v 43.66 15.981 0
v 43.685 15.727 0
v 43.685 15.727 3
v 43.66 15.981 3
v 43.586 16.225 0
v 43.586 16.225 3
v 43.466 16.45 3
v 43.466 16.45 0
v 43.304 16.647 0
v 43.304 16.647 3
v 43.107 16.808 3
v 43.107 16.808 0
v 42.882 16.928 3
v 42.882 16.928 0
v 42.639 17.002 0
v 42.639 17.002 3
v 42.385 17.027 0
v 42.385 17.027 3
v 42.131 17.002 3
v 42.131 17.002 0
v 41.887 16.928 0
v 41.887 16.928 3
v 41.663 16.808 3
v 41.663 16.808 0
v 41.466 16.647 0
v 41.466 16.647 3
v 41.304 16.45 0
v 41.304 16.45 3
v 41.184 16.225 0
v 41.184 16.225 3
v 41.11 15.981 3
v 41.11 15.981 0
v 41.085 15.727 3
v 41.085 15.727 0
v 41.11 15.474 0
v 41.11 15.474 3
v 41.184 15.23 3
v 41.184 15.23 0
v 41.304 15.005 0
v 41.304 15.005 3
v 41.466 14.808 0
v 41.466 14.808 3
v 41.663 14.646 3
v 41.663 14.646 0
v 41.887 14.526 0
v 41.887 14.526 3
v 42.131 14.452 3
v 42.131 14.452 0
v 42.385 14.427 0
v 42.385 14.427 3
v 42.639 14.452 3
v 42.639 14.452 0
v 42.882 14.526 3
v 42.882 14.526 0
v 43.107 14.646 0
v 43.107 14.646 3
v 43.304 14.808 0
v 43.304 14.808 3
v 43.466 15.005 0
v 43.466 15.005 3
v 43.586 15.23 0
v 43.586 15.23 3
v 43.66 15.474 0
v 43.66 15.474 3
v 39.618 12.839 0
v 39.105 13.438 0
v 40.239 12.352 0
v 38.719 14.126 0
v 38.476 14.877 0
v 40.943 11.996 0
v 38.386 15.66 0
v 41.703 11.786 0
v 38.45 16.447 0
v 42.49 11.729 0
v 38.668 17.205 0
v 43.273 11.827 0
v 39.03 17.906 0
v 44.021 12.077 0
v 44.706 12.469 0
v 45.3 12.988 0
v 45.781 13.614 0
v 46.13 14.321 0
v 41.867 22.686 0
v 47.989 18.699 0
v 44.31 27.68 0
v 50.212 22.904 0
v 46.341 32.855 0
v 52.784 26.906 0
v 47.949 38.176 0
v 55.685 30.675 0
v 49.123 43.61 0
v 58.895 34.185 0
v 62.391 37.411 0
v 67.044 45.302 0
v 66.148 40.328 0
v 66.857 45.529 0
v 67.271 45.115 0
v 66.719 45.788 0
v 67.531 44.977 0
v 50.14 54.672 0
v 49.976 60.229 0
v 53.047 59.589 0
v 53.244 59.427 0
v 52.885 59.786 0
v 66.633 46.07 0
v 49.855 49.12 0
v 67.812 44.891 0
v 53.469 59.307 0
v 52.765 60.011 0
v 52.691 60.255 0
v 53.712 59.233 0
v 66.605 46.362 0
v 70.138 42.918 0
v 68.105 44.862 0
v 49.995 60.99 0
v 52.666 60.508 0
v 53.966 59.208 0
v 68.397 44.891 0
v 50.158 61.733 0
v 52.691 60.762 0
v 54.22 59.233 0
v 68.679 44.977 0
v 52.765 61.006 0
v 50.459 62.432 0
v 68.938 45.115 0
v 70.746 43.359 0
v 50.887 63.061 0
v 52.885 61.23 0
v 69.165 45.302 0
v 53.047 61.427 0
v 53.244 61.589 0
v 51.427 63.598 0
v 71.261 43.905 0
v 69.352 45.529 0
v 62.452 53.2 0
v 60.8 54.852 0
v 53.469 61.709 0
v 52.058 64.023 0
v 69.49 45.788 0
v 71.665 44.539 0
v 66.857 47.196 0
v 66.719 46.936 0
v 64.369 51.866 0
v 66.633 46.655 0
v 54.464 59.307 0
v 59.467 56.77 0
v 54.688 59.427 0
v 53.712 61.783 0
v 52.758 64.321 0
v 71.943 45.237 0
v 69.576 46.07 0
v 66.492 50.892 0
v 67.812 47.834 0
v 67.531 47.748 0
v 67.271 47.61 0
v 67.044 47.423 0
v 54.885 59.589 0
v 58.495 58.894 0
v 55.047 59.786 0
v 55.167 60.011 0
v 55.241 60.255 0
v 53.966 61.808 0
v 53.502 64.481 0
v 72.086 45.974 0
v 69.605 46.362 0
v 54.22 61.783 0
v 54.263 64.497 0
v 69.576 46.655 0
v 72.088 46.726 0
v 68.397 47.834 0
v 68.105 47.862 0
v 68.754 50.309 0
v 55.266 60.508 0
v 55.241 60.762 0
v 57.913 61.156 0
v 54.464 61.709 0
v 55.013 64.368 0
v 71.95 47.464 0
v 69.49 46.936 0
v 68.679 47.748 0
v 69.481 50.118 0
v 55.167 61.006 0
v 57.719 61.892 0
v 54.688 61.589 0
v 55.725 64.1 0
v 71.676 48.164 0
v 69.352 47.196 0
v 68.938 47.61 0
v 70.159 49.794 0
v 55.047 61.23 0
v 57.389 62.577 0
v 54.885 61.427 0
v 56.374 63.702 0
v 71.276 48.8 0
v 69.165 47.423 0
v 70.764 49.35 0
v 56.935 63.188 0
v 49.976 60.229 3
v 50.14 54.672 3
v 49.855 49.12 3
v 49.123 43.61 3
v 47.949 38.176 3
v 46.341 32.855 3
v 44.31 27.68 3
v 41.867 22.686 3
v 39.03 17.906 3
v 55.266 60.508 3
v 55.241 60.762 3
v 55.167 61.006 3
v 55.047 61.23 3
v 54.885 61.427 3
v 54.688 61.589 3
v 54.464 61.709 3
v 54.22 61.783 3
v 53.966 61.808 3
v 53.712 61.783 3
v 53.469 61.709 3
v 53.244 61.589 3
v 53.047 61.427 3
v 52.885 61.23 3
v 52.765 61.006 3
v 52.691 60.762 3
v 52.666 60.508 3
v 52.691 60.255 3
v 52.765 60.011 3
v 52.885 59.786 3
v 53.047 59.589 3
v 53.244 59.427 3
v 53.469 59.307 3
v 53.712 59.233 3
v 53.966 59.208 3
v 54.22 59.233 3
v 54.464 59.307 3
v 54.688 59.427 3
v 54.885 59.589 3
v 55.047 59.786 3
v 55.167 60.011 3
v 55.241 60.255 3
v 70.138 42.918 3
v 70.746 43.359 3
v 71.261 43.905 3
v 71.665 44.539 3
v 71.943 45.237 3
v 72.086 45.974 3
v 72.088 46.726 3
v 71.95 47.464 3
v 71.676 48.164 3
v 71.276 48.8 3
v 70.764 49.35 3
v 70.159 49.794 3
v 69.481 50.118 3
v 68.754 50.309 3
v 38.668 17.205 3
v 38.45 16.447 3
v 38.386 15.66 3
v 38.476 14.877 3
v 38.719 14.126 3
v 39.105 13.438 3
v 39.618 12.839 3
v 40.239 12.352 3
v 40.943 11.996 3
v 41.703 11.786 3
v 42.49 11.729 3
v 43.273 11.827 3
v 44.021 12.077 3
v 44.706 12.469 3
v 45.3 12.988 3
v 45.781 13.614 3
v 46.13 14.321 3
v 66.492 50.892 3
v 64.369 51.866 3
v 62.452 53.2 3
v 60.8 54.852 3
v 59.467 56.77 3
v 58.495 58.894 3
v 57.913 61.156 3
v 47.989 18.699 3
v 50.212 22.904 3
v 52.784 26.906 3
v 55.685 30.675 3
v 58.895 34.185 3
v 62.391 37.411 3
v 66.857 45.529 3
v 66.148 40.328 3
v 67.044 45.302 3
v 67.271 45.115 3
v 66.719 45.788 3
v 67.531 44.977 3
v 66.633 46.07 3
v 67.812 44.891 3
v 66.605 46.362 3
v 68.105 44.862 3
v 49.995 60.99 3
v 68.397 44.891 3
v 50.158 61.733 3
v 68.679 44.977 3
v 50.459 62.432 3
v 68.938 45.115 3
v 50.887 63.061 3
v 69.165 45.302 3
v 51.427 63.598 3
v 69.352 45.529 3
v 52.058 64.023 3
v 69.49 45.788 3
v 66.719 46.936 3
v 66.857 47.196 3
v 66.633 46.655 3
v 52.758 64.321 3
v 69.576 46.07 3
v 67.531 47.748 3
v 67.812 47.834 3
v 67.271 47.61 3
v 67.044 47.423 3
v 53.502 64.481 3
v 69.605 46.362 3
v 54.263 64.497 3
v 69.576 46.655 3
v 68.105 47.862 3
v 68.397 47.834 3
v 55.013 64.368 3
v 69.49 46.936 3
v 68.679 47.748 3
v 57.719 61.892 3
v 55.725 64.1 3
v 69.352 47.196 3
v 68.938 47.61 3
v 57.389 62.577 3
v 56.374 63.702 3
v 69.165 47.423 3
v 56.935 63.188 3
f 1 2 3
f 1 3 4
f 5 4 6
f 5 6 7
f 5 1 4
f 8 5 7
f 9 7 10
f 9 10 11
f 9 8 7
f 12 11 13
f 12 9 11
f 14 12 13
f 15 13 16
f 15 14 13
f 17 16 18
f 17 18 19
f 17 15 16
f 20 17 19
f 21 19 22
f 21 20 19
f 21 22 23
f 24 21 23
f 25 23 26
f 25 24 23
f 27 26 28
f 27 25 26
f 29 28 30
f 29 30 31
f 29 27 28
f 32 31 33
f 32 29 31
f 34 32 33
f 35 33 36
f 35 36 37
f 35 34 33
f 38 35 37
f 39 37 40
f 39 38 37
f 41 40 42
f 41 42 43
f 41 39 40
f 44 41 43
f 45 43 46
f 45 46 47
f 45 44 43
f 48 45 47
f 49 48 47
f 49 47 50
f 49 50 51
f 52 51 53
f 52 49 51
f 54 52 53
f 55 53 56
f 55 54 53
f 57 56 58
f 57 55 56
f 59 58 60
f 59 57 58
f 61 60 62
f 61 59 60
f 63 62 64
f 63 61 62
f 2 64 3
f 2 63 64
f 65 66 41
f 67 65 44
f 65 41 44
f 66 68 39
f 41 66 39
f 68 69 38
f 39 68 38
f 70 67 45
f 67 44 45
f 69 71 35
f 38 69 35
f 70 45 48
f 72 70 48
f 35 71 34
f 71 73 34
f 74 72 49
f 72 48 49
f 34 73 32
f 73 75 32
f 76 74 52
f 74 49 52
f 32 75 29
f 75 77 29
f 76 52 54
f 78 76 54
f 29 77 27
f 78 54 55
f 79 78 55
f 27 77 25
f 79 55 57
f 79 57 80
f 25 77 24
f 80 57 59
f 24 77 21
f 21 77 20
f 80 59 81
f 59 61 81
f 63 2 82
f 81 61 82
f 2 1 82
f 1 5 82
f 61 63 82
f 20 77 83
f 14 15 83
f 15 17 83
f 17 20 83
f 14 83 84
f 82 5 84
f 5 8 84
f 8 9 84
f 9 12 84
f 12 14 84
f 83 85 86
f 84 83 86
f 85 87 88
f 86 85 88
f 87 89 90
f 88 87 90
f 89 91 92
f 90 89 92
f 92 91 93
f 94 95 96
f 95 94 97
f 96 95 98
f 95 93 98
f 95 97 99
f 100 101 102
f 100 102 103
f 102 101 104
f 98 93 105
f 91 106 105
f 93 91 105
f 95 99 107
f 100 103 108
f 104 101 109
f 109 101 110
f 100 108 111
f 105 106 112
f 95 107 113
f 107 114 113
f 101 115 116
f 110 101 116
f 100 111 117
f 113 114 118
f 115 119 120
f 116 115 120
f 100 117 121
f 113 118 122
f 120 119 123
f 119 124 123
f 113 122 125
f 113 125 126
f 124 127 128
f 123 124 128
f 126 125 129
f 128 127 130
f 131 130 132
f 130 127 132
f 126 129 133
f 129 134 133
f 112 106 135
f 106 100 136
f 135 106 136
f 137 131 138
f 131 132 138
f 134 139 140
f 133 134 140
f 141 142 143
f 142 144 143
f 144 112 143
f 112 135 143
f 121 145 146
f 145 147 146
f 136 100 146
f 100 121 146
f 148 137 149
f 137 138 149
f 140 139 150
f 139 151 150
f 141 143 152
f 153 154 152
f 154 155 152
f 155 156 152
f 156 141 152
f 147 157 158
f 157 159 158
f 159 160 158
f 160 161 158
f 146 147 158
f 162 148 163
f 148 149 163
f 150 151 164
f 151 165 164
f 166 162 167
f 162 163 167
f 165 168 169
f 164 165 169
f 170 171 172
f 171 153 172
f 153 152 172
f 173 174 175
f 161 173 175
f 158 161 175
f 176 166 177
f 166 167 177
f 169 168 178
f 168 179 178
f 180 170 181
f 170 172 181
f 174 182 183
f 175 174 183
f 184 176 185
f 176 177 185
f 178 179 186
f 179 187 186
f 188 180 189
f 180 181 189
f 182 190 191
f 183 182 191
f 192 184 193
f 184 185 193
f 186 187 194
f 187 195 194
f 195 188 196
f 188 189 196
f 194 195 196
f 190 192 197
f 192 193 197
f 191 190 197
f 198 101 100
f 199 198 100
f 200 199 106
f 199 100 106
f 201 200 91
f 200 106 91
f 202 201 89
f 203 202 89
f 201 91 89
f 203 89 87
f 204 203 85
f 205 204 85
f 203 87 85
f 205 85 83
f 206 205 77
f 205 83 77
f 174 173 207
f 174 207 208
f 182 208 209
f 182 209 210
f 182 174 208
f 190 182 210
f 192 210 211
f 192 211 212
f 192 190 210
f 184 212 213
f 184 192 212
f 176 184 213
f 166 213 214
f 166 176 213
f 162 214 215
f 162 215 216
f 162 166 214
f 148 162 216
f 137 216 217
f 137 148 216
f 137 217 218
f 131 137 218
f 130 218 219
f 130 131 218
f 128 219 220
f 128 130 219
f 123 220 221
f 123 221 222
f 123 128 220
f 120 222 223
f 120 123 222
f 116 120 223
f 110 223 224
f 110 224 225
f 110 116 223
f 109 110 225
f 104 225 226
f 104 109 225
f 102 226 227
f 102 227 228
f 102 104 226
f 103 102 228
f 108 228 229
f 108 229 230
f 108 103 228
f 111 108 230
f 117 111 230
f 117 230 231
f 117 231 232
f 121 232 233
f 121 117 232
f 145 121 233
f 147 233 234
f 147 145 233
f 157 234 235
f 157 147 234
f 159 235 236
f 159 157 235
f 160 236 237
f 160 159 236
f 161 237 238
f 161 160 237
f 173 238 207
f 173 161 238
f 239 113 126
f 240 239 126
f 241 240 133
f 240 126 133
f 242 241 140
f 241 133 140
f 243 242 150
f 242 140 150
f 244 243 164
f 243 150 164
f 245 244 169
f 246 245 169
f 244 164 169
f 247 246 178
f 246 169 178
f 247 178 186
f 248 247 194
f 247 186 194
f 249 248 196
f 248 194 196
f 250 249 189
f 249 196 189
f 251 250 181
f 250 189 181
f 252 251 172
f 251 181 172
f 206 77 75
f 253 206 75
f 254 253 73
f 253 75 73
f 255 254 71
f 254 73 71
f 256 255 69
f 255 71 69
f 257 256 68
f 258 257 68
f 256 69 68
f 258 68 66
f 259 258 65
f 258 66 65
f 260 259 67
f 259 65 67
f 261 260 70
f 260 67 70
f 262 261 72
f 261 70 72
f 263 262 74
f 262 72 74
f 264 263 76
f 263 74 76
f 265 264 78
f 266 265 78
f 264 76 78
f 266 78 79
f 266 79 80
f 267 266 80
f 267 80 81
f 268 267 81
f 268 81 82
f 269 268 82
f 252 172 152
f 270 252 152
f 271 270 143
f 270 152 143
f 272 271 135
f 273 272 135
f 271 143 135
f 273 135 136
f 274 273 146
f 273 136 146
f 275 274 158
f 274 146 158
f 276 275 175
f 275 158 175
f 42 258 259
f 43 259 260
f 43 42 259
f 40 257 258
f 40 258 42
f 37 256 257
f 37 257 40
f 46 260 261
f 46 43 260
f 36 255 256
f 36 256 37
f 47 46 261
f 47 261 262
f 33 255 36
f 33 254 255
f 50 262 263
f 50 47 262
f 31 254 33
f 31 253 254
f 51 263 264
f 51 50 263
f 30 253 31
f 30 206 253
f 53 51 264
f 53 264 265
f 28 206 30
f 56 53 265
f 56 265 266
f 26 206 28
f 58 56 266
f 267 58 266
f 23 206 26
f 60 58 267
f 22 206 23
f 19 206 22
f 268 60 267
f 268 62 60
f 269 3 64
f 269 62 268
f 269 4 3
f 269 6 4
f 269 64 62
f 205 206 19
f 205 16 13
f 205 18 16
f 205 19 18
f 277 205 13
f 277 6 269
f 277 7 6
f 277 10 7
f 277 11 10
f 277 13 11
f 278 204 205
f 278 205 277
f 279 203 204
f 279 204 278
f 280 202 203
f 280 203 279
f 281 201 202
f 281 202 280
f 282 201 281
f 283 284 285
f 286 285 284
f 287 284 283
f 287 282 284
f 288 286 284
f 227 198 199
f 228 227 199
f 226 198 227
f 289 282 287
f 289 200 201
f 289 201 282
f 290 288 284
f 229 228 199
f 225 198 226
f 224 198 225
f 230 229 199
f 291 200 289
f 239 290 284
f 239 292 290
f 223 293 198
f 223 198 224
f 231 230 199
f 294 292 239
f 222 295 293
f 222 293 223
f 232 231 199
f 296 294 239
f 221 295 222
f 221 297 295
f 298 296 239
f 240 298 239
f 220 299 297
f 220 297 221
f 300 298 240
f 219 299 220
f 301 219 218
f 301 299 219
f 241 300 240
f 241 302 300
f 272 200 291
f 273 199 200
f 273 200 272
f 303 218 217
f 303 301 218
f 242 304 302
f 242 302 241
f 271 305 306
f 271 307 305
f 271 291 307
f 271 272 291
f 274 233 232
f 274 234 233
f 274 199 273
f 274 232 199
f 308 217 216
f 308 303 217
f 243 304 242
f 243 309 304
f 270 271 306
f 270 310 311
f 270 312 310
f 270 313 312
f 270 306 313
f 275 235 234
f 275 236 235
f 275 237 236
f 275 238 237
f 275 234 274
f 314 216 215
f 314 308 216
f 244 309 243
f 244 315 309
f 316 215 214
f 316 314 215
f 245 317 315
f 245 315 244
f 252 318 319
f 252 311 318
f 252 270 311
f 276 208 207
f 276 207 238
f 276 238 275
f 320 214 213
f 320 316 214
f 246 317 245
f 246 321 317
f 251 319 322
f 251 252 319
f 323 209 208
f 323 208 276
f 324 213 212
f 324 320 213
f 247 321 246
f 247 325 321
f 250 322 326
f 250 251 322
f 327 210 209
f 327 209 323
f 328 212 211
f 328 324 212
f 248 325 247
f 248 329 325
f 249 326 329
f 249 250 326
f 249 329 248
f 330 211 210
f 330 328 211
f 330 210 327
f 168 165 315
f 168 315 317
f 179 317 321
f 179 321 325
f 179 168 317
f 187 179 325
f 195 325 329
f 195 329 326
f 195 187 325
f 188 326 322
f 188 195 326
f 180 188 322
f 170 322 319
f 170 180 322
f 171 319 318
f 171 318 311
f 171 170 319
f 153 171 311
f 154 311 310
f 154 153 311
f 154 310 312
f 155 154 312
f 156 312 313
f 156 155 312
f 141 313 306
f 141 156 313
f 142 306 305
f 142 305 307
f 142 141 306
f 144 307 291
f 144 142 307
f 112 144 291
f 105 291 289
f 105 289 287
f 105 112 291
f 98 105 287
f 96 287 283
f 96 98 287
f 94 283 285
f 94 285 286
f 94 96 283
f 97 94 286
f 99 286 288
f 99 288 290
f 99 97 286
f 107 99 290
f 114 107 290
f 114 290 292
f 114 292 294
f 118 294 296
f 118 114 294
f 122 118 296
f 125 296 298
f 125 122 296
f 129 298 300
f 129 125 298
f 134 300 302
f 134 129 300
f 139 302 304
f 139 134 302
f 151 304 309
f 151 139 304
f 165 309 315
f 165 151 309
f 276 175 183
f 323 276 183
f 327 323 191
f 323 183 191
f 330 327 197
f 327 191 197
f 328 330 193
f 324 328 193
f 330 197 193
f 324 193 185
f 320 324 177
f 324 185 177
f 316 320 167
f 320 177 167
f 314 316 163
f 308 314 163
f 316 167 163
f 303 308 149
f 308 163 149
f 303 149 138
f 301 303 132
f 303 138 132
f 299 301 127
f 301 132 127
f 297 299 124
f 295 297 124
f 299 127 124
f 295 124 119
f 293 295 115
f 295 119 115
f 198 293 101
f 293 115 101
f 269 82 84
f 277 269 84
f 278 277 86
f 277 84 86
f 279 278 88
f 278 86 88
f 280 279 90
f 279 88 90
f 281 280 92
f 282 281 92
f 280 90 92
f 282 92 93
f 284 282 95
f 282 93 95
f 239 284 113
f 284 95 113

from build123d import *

# Parameters (mm, degrees)
MODEL_R             = 1.300000002
MODEL_R_2           = 1.500000003
BOSS_EXTRUDE1_DEPTH = 3


with BuildPart() as part:
    # Model → Boss-Extrude1 (new body)
    with BuildSketch(Plane.XY):
        with BuildLine():
            ThreePointArc((57.913301974, 61.156066436), (53.502068591, 64.480518249), (49.975907149, 60.228795621))
            ThreePointArc((49.975907149, 60.228795621), (47.94925686, 38.176029403), (39.030226452, 17.905787524))
            ThreePointArc((39.030226452, 17.905787524), (40.582105252, 12.156647321), (46.129664865, 14.321254263))
            ThreePointArc((46.129664865, 14.321254263), (55.685249441, 30.675009463), (70.137725469, 42.917576284))
            ThreePointArc((70.137725469, 42.917576284), (72.036216679, 47.098079429), (68.754469063, 50.309155261))
            ThreePointArc((68.754469063, 50.309155261), (61.589228346, 53.988877576), (57.913301974, 61.156066436))
        make_face()
        with Locations((42.384943632, 15.727344886)):
            Circle(MODEL_R, mode=Mode.SUBTRACT)
        with Locations((53.966045378, 60.508142659)):
            Circle(MODEL_R, mode=Mode.SUBTRACT)
        with Locations((68.104570202, 46.36236227)):
            Circle(MODEL_R_2, mode=Mode.SUBTRACT)
    extrude(amount=BOSS_EXTRUDE1_DEPTH)


solid = part.part
